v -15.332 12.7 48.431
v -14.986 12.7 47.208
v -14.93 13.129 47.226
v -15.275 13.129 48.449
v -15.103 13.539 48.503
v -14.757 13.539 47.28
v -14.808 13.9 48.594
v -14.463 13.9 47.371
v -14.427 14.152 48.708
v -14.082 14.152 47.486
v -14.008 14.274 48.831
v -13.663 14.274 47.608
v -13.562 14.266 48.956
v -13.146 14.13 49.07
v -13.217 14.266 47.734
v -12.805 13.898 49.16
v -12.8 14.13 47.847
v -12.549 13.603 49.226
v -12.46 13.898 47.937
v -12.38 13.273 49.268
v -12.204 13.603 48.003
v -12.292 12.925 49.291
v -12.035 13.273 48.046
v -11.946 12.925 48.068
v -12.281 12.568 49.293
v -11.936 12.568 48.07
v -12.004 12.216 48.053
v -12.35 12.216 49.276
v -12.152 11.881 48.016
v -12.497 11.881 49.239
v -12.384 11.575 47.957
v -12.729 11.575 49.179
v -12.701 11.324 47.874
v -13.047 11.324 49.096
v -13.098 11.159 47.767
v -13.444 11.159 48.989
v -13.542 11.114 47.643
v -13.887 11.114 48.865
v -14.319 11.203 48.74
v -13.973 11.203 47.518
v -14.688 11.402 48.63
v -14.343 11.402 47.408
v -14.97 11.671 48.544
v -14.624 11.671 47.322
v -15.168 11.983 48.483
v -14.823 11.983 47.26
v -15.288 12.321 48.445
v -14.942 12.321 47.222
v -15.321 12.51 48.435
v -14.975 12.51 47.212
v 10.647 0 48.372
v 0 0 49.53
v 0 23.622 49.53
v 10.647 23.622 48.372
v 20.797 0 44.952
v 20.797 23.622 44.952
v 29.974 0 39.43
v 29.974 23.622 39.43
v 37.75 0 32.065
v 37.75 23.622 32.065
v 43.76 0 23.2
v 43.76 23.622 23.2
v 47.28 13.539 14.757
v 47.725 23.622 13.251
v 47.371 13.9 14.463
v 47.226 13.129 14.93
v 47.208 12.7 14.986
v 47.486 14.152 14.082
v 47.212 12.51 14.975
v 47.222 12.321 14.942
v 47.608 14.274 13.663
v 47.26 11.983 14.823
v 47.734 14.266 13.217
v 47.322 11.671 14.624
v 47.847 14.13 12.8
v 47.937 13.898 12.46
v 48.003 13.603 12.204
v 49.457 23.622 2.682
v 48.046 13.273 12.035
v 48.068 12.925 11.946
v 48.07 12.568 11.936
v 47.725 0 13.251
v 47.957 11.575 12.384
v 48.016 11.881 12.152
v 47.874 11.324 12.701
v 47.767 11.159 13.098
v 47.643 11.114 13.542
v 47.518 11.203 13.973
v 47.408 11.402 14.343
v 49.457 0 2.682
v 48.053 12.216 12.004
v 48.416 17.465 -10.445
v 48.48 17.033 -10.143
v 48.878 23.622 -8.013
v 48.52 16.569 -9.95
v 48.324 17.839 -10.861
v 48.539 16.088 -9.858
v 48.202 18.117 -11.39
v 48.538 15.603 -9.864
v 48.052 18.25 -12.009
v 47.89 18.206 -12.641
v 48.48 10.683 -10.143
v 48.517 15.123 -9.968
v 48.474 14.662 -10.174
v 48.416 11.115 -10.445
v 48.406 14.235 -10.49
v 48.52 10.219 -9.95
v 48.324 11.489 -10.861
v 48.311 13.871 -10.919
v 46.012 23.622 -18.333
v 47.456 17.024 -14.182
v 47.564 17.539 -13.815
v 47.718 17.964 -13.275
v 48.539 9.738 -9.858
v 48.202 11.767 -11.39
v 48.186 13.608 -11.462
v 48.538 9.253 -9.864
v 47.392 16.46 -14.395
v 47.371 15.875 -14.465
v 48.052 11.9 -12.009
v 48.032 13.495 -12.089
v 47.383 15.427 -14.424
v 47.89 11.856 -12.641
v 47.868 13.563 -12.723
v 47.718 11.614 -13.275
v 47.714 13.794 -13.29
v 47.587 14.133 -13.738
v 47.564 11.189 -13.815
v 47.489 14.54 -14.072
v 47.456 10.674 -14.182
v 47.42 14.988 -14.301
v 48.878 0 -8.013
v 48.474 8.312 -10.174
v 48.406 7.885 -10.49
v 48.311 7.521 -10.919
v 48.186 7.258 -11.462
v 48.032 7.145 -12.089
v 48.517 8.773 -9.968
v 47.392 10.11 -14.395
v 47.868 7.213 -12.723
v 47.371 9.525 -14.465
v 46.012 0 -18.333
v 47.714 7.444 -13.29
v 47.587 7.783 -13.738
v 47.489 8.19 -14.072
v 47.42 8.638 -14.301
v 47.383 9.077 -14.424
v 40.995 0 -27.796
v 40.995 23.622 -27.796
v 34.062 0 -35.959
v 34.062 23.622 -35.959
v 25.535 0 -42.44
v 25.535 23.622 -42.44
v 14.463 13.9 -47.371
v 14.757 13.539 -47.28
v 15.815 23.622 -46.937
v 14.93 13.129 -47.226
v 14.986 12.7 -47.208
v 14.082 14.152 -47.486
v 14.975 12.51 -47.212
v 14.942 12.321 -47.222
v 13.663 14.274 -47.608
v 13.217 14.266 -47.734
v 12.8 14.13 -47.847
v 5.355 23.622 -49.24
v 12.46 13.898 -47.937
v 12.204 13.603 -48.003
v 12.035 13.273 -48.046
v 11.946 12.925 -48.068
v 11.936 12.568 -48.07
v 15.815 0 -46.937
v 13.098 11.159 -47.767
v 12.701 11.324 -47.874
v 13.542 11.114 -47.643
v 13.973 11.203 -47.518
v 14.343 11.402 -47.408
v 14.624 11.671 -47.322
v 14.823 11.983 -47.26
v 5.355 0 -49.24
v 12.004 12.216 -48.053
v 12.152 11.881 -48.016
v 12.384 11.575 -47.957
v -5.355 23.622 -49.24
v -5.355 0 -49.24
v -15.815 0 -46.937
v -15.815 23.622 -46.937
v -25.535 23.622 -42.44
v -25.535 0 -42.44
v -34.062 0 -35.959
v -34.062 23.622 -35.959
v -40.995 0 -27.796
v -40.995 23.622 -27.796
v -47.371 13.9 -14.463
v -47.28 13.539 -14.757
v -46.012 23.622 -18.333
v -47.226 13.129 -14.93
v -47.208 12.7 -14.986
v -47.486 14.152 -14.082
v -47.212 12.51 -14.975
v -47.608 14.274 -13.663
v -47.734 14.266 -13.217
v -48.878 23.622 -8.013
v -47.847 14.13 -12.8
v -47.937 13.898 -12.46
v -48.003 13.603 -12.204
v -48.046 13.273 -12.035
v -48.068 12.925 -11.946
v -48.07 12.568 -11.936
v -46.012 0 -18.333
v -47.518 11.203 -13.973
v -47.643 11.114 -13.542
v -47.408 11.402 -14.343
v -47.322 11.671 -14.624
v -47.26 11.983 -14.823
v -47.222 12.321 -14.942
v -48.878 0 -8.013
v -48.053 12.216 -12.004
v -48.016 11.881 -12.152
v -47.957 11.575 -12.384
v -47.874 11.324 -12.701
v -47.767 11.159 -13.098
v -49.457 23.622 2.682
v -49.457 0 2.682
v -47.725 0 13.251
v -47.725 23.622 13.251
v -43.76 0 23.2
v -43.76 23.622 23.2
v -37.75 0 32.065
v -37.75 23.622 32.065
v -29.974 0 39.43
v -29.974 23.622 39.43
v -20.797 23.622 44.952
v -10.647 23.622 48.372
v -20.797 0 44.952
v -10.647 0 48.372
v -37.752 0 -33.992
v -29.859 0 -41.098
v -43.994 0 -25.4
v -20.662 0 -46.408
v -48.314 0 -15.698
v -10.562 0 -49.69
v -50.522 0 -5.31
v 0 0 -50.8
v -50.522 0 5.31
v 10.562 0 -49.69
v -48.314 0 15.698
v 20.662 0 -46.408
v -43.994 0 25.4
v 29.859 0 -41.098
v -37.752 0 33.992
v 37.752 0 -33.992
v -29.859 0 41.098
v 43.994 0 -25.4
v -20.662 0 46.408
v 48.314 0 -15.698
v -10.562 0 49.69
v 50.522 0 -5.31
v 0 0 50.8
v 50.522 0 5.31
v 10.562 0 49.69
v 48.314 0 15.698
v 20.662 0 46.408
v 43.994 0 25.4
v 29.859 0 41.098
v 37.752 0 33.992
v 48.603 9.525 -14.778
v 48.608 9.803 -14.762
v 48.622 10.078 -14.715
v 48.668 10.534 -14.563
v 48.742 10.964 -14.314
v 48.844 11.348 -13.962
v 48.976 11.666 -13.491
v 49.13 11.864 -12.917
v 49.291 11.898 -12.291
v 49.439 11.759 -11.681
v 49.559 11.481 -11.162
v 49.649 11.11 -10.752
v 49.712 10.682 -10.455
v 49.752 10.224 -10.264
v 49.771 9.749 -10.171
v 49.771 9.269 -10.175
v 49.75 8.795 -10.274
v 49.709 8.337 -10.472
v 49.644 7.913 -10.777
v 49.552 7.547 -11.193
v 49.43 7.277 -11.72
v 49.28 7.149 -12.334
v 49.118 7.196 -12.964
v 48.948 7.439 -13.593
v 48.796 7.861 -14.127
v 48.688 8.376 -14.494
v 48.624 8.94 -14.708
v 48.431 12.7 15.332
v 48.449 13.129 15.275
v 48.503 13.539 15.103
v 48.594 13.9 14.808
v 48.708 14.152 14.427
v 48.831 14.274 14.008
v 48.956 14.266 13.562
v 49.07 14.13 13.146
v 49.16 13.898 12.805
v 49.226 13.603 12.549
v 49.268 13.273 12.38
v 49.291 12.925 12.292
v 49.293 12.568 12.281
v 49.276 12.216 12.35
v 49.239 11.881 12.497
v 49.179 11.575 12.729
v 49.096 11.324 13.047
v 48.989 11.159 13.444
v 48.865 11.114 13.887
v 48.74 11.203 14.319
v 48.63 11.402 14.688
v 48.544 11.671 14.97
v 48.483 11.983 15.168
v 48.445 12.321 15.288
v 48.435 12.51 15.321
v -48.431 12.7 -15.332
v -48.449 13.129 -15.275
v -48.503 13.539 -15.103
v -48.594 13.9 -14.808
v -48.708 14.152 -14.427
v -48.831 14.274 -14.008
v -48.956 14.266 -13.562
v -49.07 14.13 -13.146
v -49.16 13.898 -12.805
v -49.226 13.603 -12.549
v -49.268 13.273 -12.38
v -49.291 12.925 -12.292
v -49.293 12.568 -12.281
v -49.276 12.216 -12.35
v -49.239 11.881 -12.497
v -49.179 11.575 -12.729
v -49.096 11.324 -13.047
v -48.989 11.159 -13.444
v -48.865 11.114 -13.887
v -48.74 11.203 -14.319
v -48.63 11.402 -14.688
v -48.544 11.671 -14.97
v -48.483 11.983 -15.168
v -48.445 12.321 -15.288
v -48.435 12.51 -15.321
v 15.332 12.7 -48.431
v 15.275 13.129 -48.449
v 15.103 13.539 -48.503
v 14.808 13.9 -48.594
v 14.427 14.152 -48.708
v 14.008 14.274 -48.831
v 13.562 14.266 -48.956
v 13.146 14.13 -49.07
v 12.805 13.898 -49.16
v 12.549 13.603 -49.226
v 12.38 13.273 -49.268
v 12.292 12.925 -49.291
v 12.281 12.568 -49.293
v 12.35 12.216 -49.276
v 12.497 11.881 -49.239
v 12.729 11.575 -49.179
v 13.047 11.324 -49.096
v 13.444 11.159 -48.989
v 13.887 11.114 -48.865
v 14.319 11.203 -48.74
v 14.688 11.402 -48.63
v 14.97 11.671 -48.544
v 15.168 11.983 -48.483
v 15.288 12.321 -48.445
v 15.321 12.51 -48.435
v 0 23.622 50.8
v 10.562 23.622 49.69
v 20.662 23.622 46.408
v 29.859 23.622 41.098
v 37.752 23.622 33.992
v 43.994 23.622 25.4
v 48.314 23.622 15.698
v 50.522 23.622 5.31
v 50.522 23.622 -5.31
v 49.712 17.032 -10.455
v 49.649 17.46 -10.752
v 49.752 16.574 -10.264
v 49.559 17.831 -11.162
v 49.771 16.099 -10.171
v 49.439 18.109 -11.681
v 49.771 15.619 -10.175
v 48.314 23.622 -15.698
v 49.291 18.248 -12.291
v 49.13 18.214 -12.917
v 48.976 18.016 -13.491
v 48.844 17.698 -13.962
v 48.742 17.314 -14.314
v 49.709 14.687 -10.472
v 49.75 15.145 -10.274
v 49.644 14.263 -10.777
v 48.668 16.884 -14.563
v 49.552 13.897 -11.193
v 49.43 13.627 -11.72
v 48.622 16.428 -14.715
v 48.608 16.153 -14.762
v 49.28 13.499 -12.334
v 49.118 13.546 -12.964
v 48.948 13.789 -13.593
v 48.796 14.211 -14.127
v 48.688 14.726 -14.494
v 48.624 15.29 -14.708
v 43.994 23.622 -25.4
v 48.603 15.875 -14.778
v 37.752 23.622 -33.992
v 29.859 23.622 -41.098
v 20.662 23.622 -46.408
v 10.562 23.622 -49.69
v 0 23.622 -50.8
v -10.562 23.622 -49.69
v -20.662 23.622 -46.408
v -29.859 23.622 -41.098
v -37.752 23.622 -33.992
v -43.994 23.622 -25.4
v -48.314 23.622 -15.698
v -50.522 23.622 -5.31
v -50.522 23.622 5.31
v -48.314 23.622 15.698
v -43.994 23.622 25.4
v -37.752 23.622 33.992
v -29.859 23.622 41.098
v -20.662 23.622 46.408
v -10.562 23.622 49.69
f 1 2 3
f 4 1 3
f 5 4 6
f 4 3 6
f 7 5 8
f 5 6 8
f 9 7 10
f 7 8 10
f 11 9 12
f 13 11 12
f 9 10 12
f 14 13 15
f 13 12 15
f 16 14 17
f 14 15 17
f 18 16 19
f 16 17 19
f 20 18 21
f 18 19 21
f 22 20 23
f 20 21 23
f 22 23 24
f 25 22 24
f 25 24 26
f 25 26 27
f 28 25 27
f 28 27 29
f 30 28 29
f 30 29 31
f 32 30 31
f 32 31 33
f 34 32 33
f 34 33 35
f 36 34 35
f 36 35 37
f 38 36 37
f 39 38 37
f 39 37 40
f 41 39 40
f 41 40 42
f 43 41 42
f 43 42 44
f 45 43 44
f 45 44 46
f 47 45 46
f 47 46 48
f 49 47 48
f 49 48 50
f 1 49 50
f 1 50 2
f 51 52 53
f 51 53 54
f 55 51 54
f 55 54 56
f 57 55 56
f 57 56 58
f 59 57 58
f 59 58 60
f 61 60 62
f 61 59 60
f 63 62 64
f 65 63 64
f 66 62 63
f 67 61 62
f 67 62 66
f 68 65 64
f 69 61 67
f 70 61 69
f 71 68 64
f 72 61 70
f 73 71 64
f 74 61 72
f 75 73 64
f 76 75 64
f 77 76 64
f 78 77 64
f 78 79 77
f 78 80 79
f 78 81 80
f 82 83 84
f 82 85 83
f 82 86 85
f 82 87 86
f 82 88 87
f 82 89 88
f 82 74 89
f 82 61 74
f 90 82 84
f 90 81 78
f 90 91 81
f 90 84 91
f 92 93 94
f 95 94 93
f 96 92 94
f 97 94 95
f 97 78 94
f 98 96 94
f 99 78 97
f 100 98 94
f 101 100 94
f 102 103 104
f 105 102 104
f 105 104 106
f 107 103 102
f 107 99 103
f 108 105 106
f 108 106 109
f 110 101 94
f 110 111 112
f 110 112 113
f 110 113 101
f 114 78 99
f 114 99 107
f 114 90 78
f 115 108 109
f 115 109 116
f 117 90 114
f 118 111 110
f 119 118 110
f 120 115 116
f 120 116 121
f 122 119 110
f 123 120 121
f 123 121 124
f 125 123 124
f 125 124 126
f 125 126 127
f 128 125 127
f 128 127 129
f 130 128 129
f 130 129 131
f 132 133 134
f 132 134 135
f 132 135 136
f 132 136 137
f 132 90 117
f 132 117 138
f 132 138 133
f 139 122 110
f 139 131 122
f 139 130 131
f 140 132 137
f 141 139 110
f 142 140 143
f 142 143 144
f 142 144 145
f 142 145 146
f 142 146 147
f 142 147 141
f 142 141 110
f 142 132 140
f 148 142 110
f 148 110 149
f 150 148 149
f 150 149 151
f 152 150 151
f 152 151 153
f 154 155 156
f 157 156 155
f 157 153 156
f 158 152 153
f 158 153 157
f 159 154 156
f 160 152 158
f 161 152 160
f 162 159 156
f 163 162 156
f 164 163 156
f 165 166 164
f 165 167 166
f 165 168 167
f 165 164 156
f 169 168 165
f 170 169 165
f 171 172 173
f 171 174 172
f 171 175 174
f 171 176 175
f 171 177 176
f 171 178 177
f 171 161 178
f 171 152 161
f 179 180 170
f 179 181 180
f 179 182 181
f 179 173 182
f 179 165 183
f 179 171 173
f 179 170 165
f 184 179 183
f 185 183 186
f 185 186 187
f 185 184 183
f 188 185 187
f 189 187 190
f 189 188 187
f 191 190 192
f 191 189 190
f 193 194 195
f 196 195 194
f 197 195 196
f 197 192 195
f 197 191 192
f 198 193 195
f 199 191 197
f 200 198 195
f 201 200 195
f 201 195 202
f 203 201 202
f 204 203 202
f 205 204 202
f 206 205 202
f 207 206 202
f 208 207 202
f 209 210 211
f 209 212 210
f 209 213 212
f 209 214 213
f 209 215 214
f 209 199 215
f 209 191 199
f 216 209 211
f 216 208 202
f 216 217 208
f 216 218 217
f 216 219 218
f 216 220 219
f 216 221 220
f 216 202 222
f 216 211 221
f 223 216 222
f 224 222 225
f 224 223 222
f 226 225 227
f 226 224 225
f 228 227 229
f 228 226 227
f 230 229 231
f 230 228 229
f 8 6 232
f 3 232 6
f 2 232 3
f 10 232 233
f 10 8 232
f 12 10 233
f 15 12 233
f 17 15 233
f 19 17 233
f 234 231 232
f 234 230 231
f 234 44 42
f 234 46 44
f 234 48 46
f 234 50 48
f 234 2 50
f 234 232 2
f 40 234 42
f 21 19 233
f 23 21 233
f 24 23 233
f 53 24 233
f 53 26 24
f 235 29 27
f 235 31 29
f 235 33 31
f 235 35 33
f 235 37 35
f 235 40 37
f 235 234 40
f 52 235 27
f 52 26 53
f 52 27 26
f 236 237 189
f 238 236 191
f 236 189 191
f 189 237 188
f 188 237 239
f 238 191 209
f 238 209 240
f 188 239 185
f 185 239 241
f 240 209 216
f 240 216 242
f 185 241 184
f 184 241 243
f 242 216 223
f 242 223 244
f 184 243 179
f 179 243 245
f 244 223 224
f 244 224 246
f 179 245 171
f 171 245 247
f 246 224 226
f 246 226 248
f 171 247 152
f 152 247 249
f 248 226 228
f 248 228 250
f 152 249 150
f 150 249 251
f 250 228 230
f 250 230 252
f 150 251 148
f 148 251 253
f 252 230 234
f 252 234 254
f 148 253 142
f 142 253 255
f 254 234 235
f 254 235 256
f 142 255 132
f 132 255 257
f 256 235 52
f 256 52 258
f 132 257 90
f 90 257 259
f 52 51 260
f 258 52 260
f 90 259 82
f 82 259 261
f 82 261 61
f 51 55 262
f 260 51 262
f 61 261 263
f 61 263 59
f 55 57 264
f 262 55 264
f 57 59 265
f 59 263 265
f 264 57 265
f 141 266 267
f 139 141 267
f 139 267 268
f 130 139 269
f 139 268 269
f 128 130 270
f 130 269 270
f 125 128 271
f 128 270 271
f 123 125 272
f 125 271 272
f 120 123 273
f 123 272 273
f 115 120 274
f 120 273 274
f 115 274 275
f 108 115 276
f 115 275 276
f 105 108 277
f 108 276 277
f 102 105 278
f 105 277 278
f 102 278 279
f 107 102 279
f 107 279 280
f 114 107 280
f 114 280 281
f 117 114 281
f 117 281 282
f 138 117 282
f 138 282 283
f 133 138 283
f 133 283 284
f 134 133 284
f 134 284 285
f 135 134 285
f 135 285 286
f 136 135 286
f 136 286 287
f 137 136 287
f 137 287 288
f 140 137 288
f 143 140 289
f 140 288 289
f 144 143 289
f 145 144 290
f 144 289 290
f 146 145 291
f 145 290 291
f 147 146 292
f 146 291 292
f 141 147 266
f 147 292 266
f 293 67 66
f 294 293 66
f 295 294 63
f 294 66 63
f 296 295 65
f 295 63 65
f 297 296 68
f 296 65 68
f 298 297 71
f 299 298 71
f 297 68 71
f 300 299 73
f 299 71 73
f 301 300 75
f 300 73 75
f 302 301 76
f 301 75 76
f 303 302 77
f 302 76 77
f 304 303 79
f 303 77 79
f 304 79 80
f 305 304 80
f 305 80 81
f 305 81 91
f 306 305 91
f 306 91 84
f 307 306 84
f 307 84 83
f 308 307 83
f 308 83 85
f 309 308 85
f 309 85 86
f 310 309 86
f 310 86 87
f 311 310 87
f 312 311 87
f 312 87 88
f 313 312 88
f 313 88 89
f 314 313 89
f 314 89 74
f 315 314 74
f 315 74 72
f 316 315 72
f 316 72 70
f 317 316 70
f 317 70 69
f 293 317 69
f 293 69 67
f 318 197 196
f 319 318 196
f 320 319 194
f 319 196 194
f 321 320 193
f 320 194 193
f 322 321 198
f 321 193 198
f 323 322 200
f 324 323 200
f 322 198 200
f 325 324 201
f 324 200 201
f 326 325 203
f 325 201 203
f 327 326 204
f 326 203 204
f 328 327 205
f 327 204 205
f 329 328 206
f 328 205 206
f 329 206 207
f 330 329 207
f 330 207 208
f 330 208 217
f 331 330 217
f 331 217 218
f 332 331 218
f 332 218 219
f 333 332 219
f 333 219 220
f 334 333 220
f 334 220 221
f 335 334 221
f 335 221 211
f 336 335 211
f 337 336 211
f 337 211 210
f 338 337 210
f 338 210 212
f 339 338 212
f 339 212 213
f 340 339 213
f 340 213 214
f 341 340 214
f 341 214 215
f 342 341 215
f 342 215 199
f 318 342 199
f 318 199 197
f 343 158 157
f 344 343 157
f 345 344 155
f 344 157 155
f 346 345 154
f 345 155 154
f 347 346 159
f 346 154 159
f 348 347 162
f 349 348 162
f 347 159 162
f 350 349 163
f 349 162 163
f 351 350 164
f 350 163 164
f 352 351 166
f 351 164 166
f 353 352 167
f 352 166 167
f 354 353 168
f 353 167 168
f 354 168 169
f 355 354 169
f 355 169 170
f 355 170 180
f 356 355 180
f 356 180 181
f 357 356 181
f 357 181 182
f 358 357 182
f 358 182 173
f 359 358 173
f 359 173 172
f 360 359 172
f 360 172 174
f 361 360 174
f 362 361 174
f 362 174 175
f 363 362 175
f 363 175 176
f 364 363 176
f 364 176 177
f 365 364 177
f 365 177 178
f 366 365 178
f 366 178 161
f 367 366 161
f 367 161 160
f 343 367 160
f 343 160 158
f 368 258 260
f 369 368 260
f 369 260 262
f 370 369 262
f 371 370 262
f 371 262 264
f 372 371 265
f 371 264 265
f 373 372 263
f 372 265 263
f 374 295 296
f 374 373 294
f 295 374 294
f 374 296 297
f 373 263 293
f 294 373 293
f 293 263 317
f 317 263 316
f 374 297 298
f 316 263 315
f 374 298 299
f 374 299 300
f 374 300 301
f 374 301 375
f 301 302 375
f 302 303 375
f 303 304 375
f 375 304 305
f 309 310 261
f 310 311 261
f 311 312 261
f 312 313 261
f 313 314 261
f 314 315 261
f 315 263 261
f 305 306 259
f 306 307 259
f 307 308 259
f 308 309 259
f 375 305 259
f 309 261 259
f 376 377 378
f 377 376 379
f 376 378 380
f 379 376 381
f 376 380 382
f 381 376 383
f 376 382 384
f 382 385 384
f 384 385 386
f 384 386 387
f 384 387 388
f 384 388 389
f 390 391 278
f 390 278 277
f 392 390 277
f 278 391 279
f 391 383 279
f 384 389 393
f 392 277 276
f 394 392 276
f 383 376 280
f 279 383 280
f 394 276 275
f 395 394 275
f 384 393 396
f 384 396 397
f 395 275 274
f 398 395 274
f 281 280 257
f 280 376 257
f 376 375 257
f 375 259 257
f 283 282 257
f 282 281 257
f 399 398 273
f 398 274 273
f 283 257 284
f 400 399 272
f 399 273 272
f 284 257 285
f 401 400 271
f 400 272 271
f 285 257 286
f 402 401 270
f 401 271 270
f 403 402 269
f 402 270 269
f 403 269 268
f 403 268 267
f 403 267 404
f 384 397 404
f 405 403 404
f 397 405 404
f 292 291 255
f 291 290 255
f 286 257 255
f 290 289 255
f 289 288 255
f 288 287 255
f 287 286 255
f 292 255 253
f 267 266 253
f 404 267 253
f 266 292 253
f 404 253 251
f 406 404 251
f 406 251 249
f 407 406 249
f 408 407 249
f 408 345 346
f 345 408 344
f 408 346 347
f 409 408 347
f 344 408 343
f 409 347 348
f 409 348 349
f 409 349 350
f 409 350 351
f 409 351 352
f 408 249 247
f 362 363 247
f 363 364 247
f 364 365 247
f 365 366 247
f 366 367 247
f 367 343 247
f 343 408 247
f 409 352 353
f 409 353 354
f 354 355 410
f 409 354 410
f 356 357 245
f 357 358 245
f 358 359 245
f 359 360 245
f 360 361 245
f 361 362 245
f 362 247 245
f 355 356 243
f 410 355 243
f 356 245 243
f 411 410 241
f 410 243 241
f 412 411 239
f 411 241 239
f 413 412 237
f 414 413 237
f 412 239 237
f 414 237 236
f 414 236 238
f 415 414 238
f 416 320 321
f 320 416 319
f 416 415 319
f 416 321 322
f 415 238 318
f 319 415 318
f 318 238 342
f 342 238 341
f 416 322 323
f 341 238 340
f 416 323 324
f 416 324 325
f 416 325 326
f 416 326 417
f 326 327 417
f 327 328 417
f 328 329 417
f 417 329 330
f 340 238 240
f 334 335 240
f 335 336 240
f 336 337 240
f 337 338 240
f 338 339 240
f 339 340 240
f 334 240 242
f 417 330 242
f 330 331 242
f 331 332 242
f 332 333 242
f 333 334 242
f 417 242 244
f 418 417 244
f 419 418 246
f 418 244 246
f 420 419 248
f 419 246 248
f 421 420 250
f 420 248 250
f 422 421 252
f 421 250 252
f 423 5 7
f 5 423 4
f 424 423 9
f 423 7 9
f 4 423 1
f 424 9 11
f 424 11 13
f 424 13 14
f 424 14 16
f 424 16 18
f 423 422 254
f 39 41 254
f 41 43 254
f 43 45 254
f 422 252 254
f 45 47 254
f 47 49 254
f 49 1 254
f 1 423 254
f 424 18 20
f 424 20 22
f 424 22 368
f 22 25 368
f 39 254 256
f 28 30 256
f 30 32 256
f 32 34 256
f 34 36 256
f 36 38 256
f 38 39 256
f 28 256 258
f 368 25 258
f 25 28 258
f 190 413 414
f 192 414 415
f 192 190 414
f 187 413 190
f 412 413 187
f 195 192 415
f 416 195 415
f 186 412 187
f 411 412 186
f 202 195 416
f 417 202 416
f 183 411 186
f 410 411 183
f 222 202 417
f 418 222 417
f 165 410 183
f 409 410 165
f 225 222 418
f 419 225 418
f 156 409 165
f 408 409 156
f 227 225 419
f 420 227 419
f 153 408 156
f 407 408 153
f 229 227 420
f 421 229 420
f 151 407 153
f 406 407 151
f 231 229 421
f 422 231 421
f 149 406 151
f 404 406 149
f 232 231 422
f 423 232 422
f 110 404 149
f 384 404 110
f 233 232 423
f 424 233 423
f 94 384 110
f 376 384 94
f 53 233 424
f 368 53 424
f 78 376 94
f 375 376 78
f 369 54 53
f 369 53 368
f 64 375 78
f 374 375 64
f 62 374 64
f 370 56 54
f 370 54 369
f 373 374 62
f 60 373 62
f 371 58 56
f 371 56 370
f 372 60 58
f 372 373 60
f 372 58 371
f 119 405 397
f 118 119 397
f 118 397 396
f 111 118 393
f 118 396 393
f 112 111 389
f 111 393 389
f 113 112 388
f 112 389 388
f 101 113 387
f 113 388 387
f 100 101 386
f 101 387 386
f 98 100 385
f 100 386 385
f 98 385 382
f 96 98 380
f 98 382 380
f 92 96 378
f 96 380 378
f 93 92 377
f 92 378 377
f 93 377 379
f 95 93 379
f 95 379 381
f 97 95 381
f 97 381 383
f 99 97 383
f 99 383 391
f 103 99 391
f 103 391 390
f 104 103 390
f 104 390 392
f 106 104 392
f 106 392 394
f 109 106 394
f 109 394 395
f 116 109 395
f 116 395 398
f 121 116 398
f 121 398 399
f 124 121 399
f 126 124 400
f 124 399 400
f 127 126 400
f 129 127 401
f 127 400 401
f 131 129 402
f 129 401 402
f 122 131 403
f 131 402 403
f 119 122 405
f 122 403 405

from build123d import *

# Parameters (mm, degrees)
SKETCH1_R           = 50.8
SKETCH1_R_2         = 49.53
BOSS_EXTRUDE1_DEPTH = 23.622
SKETCH2_R           = 2.38125
CUT_EXTRUDE1_DEPTH  = 25.4
SKETCH3_R           = 1.5875
CUT_EXTRUDE2_DEPTH  = 37.338
CIRPATTERN1_COUNT   = 4


with BuildPart() as part:
    # Sketch1 → Boss-Extrude1 (new body)
    with BuildSketch(Plane(origin=(0, 0, 0), x_dir=(1, 0, 0), z_dir=(0, 1, 0))):
        with Locations(Location((0, 0, 0), (0, 0, 270))):
            Circle(SKETCH1_R)
        with Locations(Location((0, 0, 0), (0, 0, 270))):
            Circle(SKETCH1_R_2, mode=Mode.SUBTRACT)
    extrude(amount=BOSS_EXTRUDE1_DEPTH)

    # Sketch2 → Cut-Extrude1 (cut)
    with BuildSketch(Plane(origin=(80.709285485, 206.333156205, 111.645979585), x_dir=(0, -1, 0), z_dir=(0.9693386284605577, 0, -0.2457287597620699))):
        with Locations(Location((196.808156205, 128.055353348, 0), (0, 0, 90))):
            Circle(SKETCH2_R)
        with Locations(Location((190.458156205, 128.055353348, 0), (0, 0, 90))):
            Circle(SKETCH2_R)
    extrude(amount=-CUT_EXTRUDE1_DEPTH, mode=Mode.SUBTRACT)

    # Sketch3 → Cut-Extrude2 (cut)
    with BuildSketch(Plane(origin=(-3.10026152, 207.778194099, 134.798971935), x_dir=(0, 1, 0), z_dir=(-0.962336256997443, 0, -0.27186196583588446))):
        with Locations(Location((-195.078194099, 130.56478129, 0), (0, 0, 270))):
            Circle(SKETCH3_R)
    cut_extrude2 = extrude(amount=-CUT_EXTRUDE2_DEPTH, mode=Mode.SUBTRACT)

    # CirPattern1: Cut-Extrude2 ×4 about axis
    cirpattern1_axis = Axis((0, 0, 0), (0, -1, 0))
    for i in range(1, CIRPATTERN1_COUNT):
        add(cut_extrude2.rotate(cirpattern1_axis, i * 360 / CIRPATTERN1_COUNT), mode=Mode.SUBTRACT)


solid = part.part
